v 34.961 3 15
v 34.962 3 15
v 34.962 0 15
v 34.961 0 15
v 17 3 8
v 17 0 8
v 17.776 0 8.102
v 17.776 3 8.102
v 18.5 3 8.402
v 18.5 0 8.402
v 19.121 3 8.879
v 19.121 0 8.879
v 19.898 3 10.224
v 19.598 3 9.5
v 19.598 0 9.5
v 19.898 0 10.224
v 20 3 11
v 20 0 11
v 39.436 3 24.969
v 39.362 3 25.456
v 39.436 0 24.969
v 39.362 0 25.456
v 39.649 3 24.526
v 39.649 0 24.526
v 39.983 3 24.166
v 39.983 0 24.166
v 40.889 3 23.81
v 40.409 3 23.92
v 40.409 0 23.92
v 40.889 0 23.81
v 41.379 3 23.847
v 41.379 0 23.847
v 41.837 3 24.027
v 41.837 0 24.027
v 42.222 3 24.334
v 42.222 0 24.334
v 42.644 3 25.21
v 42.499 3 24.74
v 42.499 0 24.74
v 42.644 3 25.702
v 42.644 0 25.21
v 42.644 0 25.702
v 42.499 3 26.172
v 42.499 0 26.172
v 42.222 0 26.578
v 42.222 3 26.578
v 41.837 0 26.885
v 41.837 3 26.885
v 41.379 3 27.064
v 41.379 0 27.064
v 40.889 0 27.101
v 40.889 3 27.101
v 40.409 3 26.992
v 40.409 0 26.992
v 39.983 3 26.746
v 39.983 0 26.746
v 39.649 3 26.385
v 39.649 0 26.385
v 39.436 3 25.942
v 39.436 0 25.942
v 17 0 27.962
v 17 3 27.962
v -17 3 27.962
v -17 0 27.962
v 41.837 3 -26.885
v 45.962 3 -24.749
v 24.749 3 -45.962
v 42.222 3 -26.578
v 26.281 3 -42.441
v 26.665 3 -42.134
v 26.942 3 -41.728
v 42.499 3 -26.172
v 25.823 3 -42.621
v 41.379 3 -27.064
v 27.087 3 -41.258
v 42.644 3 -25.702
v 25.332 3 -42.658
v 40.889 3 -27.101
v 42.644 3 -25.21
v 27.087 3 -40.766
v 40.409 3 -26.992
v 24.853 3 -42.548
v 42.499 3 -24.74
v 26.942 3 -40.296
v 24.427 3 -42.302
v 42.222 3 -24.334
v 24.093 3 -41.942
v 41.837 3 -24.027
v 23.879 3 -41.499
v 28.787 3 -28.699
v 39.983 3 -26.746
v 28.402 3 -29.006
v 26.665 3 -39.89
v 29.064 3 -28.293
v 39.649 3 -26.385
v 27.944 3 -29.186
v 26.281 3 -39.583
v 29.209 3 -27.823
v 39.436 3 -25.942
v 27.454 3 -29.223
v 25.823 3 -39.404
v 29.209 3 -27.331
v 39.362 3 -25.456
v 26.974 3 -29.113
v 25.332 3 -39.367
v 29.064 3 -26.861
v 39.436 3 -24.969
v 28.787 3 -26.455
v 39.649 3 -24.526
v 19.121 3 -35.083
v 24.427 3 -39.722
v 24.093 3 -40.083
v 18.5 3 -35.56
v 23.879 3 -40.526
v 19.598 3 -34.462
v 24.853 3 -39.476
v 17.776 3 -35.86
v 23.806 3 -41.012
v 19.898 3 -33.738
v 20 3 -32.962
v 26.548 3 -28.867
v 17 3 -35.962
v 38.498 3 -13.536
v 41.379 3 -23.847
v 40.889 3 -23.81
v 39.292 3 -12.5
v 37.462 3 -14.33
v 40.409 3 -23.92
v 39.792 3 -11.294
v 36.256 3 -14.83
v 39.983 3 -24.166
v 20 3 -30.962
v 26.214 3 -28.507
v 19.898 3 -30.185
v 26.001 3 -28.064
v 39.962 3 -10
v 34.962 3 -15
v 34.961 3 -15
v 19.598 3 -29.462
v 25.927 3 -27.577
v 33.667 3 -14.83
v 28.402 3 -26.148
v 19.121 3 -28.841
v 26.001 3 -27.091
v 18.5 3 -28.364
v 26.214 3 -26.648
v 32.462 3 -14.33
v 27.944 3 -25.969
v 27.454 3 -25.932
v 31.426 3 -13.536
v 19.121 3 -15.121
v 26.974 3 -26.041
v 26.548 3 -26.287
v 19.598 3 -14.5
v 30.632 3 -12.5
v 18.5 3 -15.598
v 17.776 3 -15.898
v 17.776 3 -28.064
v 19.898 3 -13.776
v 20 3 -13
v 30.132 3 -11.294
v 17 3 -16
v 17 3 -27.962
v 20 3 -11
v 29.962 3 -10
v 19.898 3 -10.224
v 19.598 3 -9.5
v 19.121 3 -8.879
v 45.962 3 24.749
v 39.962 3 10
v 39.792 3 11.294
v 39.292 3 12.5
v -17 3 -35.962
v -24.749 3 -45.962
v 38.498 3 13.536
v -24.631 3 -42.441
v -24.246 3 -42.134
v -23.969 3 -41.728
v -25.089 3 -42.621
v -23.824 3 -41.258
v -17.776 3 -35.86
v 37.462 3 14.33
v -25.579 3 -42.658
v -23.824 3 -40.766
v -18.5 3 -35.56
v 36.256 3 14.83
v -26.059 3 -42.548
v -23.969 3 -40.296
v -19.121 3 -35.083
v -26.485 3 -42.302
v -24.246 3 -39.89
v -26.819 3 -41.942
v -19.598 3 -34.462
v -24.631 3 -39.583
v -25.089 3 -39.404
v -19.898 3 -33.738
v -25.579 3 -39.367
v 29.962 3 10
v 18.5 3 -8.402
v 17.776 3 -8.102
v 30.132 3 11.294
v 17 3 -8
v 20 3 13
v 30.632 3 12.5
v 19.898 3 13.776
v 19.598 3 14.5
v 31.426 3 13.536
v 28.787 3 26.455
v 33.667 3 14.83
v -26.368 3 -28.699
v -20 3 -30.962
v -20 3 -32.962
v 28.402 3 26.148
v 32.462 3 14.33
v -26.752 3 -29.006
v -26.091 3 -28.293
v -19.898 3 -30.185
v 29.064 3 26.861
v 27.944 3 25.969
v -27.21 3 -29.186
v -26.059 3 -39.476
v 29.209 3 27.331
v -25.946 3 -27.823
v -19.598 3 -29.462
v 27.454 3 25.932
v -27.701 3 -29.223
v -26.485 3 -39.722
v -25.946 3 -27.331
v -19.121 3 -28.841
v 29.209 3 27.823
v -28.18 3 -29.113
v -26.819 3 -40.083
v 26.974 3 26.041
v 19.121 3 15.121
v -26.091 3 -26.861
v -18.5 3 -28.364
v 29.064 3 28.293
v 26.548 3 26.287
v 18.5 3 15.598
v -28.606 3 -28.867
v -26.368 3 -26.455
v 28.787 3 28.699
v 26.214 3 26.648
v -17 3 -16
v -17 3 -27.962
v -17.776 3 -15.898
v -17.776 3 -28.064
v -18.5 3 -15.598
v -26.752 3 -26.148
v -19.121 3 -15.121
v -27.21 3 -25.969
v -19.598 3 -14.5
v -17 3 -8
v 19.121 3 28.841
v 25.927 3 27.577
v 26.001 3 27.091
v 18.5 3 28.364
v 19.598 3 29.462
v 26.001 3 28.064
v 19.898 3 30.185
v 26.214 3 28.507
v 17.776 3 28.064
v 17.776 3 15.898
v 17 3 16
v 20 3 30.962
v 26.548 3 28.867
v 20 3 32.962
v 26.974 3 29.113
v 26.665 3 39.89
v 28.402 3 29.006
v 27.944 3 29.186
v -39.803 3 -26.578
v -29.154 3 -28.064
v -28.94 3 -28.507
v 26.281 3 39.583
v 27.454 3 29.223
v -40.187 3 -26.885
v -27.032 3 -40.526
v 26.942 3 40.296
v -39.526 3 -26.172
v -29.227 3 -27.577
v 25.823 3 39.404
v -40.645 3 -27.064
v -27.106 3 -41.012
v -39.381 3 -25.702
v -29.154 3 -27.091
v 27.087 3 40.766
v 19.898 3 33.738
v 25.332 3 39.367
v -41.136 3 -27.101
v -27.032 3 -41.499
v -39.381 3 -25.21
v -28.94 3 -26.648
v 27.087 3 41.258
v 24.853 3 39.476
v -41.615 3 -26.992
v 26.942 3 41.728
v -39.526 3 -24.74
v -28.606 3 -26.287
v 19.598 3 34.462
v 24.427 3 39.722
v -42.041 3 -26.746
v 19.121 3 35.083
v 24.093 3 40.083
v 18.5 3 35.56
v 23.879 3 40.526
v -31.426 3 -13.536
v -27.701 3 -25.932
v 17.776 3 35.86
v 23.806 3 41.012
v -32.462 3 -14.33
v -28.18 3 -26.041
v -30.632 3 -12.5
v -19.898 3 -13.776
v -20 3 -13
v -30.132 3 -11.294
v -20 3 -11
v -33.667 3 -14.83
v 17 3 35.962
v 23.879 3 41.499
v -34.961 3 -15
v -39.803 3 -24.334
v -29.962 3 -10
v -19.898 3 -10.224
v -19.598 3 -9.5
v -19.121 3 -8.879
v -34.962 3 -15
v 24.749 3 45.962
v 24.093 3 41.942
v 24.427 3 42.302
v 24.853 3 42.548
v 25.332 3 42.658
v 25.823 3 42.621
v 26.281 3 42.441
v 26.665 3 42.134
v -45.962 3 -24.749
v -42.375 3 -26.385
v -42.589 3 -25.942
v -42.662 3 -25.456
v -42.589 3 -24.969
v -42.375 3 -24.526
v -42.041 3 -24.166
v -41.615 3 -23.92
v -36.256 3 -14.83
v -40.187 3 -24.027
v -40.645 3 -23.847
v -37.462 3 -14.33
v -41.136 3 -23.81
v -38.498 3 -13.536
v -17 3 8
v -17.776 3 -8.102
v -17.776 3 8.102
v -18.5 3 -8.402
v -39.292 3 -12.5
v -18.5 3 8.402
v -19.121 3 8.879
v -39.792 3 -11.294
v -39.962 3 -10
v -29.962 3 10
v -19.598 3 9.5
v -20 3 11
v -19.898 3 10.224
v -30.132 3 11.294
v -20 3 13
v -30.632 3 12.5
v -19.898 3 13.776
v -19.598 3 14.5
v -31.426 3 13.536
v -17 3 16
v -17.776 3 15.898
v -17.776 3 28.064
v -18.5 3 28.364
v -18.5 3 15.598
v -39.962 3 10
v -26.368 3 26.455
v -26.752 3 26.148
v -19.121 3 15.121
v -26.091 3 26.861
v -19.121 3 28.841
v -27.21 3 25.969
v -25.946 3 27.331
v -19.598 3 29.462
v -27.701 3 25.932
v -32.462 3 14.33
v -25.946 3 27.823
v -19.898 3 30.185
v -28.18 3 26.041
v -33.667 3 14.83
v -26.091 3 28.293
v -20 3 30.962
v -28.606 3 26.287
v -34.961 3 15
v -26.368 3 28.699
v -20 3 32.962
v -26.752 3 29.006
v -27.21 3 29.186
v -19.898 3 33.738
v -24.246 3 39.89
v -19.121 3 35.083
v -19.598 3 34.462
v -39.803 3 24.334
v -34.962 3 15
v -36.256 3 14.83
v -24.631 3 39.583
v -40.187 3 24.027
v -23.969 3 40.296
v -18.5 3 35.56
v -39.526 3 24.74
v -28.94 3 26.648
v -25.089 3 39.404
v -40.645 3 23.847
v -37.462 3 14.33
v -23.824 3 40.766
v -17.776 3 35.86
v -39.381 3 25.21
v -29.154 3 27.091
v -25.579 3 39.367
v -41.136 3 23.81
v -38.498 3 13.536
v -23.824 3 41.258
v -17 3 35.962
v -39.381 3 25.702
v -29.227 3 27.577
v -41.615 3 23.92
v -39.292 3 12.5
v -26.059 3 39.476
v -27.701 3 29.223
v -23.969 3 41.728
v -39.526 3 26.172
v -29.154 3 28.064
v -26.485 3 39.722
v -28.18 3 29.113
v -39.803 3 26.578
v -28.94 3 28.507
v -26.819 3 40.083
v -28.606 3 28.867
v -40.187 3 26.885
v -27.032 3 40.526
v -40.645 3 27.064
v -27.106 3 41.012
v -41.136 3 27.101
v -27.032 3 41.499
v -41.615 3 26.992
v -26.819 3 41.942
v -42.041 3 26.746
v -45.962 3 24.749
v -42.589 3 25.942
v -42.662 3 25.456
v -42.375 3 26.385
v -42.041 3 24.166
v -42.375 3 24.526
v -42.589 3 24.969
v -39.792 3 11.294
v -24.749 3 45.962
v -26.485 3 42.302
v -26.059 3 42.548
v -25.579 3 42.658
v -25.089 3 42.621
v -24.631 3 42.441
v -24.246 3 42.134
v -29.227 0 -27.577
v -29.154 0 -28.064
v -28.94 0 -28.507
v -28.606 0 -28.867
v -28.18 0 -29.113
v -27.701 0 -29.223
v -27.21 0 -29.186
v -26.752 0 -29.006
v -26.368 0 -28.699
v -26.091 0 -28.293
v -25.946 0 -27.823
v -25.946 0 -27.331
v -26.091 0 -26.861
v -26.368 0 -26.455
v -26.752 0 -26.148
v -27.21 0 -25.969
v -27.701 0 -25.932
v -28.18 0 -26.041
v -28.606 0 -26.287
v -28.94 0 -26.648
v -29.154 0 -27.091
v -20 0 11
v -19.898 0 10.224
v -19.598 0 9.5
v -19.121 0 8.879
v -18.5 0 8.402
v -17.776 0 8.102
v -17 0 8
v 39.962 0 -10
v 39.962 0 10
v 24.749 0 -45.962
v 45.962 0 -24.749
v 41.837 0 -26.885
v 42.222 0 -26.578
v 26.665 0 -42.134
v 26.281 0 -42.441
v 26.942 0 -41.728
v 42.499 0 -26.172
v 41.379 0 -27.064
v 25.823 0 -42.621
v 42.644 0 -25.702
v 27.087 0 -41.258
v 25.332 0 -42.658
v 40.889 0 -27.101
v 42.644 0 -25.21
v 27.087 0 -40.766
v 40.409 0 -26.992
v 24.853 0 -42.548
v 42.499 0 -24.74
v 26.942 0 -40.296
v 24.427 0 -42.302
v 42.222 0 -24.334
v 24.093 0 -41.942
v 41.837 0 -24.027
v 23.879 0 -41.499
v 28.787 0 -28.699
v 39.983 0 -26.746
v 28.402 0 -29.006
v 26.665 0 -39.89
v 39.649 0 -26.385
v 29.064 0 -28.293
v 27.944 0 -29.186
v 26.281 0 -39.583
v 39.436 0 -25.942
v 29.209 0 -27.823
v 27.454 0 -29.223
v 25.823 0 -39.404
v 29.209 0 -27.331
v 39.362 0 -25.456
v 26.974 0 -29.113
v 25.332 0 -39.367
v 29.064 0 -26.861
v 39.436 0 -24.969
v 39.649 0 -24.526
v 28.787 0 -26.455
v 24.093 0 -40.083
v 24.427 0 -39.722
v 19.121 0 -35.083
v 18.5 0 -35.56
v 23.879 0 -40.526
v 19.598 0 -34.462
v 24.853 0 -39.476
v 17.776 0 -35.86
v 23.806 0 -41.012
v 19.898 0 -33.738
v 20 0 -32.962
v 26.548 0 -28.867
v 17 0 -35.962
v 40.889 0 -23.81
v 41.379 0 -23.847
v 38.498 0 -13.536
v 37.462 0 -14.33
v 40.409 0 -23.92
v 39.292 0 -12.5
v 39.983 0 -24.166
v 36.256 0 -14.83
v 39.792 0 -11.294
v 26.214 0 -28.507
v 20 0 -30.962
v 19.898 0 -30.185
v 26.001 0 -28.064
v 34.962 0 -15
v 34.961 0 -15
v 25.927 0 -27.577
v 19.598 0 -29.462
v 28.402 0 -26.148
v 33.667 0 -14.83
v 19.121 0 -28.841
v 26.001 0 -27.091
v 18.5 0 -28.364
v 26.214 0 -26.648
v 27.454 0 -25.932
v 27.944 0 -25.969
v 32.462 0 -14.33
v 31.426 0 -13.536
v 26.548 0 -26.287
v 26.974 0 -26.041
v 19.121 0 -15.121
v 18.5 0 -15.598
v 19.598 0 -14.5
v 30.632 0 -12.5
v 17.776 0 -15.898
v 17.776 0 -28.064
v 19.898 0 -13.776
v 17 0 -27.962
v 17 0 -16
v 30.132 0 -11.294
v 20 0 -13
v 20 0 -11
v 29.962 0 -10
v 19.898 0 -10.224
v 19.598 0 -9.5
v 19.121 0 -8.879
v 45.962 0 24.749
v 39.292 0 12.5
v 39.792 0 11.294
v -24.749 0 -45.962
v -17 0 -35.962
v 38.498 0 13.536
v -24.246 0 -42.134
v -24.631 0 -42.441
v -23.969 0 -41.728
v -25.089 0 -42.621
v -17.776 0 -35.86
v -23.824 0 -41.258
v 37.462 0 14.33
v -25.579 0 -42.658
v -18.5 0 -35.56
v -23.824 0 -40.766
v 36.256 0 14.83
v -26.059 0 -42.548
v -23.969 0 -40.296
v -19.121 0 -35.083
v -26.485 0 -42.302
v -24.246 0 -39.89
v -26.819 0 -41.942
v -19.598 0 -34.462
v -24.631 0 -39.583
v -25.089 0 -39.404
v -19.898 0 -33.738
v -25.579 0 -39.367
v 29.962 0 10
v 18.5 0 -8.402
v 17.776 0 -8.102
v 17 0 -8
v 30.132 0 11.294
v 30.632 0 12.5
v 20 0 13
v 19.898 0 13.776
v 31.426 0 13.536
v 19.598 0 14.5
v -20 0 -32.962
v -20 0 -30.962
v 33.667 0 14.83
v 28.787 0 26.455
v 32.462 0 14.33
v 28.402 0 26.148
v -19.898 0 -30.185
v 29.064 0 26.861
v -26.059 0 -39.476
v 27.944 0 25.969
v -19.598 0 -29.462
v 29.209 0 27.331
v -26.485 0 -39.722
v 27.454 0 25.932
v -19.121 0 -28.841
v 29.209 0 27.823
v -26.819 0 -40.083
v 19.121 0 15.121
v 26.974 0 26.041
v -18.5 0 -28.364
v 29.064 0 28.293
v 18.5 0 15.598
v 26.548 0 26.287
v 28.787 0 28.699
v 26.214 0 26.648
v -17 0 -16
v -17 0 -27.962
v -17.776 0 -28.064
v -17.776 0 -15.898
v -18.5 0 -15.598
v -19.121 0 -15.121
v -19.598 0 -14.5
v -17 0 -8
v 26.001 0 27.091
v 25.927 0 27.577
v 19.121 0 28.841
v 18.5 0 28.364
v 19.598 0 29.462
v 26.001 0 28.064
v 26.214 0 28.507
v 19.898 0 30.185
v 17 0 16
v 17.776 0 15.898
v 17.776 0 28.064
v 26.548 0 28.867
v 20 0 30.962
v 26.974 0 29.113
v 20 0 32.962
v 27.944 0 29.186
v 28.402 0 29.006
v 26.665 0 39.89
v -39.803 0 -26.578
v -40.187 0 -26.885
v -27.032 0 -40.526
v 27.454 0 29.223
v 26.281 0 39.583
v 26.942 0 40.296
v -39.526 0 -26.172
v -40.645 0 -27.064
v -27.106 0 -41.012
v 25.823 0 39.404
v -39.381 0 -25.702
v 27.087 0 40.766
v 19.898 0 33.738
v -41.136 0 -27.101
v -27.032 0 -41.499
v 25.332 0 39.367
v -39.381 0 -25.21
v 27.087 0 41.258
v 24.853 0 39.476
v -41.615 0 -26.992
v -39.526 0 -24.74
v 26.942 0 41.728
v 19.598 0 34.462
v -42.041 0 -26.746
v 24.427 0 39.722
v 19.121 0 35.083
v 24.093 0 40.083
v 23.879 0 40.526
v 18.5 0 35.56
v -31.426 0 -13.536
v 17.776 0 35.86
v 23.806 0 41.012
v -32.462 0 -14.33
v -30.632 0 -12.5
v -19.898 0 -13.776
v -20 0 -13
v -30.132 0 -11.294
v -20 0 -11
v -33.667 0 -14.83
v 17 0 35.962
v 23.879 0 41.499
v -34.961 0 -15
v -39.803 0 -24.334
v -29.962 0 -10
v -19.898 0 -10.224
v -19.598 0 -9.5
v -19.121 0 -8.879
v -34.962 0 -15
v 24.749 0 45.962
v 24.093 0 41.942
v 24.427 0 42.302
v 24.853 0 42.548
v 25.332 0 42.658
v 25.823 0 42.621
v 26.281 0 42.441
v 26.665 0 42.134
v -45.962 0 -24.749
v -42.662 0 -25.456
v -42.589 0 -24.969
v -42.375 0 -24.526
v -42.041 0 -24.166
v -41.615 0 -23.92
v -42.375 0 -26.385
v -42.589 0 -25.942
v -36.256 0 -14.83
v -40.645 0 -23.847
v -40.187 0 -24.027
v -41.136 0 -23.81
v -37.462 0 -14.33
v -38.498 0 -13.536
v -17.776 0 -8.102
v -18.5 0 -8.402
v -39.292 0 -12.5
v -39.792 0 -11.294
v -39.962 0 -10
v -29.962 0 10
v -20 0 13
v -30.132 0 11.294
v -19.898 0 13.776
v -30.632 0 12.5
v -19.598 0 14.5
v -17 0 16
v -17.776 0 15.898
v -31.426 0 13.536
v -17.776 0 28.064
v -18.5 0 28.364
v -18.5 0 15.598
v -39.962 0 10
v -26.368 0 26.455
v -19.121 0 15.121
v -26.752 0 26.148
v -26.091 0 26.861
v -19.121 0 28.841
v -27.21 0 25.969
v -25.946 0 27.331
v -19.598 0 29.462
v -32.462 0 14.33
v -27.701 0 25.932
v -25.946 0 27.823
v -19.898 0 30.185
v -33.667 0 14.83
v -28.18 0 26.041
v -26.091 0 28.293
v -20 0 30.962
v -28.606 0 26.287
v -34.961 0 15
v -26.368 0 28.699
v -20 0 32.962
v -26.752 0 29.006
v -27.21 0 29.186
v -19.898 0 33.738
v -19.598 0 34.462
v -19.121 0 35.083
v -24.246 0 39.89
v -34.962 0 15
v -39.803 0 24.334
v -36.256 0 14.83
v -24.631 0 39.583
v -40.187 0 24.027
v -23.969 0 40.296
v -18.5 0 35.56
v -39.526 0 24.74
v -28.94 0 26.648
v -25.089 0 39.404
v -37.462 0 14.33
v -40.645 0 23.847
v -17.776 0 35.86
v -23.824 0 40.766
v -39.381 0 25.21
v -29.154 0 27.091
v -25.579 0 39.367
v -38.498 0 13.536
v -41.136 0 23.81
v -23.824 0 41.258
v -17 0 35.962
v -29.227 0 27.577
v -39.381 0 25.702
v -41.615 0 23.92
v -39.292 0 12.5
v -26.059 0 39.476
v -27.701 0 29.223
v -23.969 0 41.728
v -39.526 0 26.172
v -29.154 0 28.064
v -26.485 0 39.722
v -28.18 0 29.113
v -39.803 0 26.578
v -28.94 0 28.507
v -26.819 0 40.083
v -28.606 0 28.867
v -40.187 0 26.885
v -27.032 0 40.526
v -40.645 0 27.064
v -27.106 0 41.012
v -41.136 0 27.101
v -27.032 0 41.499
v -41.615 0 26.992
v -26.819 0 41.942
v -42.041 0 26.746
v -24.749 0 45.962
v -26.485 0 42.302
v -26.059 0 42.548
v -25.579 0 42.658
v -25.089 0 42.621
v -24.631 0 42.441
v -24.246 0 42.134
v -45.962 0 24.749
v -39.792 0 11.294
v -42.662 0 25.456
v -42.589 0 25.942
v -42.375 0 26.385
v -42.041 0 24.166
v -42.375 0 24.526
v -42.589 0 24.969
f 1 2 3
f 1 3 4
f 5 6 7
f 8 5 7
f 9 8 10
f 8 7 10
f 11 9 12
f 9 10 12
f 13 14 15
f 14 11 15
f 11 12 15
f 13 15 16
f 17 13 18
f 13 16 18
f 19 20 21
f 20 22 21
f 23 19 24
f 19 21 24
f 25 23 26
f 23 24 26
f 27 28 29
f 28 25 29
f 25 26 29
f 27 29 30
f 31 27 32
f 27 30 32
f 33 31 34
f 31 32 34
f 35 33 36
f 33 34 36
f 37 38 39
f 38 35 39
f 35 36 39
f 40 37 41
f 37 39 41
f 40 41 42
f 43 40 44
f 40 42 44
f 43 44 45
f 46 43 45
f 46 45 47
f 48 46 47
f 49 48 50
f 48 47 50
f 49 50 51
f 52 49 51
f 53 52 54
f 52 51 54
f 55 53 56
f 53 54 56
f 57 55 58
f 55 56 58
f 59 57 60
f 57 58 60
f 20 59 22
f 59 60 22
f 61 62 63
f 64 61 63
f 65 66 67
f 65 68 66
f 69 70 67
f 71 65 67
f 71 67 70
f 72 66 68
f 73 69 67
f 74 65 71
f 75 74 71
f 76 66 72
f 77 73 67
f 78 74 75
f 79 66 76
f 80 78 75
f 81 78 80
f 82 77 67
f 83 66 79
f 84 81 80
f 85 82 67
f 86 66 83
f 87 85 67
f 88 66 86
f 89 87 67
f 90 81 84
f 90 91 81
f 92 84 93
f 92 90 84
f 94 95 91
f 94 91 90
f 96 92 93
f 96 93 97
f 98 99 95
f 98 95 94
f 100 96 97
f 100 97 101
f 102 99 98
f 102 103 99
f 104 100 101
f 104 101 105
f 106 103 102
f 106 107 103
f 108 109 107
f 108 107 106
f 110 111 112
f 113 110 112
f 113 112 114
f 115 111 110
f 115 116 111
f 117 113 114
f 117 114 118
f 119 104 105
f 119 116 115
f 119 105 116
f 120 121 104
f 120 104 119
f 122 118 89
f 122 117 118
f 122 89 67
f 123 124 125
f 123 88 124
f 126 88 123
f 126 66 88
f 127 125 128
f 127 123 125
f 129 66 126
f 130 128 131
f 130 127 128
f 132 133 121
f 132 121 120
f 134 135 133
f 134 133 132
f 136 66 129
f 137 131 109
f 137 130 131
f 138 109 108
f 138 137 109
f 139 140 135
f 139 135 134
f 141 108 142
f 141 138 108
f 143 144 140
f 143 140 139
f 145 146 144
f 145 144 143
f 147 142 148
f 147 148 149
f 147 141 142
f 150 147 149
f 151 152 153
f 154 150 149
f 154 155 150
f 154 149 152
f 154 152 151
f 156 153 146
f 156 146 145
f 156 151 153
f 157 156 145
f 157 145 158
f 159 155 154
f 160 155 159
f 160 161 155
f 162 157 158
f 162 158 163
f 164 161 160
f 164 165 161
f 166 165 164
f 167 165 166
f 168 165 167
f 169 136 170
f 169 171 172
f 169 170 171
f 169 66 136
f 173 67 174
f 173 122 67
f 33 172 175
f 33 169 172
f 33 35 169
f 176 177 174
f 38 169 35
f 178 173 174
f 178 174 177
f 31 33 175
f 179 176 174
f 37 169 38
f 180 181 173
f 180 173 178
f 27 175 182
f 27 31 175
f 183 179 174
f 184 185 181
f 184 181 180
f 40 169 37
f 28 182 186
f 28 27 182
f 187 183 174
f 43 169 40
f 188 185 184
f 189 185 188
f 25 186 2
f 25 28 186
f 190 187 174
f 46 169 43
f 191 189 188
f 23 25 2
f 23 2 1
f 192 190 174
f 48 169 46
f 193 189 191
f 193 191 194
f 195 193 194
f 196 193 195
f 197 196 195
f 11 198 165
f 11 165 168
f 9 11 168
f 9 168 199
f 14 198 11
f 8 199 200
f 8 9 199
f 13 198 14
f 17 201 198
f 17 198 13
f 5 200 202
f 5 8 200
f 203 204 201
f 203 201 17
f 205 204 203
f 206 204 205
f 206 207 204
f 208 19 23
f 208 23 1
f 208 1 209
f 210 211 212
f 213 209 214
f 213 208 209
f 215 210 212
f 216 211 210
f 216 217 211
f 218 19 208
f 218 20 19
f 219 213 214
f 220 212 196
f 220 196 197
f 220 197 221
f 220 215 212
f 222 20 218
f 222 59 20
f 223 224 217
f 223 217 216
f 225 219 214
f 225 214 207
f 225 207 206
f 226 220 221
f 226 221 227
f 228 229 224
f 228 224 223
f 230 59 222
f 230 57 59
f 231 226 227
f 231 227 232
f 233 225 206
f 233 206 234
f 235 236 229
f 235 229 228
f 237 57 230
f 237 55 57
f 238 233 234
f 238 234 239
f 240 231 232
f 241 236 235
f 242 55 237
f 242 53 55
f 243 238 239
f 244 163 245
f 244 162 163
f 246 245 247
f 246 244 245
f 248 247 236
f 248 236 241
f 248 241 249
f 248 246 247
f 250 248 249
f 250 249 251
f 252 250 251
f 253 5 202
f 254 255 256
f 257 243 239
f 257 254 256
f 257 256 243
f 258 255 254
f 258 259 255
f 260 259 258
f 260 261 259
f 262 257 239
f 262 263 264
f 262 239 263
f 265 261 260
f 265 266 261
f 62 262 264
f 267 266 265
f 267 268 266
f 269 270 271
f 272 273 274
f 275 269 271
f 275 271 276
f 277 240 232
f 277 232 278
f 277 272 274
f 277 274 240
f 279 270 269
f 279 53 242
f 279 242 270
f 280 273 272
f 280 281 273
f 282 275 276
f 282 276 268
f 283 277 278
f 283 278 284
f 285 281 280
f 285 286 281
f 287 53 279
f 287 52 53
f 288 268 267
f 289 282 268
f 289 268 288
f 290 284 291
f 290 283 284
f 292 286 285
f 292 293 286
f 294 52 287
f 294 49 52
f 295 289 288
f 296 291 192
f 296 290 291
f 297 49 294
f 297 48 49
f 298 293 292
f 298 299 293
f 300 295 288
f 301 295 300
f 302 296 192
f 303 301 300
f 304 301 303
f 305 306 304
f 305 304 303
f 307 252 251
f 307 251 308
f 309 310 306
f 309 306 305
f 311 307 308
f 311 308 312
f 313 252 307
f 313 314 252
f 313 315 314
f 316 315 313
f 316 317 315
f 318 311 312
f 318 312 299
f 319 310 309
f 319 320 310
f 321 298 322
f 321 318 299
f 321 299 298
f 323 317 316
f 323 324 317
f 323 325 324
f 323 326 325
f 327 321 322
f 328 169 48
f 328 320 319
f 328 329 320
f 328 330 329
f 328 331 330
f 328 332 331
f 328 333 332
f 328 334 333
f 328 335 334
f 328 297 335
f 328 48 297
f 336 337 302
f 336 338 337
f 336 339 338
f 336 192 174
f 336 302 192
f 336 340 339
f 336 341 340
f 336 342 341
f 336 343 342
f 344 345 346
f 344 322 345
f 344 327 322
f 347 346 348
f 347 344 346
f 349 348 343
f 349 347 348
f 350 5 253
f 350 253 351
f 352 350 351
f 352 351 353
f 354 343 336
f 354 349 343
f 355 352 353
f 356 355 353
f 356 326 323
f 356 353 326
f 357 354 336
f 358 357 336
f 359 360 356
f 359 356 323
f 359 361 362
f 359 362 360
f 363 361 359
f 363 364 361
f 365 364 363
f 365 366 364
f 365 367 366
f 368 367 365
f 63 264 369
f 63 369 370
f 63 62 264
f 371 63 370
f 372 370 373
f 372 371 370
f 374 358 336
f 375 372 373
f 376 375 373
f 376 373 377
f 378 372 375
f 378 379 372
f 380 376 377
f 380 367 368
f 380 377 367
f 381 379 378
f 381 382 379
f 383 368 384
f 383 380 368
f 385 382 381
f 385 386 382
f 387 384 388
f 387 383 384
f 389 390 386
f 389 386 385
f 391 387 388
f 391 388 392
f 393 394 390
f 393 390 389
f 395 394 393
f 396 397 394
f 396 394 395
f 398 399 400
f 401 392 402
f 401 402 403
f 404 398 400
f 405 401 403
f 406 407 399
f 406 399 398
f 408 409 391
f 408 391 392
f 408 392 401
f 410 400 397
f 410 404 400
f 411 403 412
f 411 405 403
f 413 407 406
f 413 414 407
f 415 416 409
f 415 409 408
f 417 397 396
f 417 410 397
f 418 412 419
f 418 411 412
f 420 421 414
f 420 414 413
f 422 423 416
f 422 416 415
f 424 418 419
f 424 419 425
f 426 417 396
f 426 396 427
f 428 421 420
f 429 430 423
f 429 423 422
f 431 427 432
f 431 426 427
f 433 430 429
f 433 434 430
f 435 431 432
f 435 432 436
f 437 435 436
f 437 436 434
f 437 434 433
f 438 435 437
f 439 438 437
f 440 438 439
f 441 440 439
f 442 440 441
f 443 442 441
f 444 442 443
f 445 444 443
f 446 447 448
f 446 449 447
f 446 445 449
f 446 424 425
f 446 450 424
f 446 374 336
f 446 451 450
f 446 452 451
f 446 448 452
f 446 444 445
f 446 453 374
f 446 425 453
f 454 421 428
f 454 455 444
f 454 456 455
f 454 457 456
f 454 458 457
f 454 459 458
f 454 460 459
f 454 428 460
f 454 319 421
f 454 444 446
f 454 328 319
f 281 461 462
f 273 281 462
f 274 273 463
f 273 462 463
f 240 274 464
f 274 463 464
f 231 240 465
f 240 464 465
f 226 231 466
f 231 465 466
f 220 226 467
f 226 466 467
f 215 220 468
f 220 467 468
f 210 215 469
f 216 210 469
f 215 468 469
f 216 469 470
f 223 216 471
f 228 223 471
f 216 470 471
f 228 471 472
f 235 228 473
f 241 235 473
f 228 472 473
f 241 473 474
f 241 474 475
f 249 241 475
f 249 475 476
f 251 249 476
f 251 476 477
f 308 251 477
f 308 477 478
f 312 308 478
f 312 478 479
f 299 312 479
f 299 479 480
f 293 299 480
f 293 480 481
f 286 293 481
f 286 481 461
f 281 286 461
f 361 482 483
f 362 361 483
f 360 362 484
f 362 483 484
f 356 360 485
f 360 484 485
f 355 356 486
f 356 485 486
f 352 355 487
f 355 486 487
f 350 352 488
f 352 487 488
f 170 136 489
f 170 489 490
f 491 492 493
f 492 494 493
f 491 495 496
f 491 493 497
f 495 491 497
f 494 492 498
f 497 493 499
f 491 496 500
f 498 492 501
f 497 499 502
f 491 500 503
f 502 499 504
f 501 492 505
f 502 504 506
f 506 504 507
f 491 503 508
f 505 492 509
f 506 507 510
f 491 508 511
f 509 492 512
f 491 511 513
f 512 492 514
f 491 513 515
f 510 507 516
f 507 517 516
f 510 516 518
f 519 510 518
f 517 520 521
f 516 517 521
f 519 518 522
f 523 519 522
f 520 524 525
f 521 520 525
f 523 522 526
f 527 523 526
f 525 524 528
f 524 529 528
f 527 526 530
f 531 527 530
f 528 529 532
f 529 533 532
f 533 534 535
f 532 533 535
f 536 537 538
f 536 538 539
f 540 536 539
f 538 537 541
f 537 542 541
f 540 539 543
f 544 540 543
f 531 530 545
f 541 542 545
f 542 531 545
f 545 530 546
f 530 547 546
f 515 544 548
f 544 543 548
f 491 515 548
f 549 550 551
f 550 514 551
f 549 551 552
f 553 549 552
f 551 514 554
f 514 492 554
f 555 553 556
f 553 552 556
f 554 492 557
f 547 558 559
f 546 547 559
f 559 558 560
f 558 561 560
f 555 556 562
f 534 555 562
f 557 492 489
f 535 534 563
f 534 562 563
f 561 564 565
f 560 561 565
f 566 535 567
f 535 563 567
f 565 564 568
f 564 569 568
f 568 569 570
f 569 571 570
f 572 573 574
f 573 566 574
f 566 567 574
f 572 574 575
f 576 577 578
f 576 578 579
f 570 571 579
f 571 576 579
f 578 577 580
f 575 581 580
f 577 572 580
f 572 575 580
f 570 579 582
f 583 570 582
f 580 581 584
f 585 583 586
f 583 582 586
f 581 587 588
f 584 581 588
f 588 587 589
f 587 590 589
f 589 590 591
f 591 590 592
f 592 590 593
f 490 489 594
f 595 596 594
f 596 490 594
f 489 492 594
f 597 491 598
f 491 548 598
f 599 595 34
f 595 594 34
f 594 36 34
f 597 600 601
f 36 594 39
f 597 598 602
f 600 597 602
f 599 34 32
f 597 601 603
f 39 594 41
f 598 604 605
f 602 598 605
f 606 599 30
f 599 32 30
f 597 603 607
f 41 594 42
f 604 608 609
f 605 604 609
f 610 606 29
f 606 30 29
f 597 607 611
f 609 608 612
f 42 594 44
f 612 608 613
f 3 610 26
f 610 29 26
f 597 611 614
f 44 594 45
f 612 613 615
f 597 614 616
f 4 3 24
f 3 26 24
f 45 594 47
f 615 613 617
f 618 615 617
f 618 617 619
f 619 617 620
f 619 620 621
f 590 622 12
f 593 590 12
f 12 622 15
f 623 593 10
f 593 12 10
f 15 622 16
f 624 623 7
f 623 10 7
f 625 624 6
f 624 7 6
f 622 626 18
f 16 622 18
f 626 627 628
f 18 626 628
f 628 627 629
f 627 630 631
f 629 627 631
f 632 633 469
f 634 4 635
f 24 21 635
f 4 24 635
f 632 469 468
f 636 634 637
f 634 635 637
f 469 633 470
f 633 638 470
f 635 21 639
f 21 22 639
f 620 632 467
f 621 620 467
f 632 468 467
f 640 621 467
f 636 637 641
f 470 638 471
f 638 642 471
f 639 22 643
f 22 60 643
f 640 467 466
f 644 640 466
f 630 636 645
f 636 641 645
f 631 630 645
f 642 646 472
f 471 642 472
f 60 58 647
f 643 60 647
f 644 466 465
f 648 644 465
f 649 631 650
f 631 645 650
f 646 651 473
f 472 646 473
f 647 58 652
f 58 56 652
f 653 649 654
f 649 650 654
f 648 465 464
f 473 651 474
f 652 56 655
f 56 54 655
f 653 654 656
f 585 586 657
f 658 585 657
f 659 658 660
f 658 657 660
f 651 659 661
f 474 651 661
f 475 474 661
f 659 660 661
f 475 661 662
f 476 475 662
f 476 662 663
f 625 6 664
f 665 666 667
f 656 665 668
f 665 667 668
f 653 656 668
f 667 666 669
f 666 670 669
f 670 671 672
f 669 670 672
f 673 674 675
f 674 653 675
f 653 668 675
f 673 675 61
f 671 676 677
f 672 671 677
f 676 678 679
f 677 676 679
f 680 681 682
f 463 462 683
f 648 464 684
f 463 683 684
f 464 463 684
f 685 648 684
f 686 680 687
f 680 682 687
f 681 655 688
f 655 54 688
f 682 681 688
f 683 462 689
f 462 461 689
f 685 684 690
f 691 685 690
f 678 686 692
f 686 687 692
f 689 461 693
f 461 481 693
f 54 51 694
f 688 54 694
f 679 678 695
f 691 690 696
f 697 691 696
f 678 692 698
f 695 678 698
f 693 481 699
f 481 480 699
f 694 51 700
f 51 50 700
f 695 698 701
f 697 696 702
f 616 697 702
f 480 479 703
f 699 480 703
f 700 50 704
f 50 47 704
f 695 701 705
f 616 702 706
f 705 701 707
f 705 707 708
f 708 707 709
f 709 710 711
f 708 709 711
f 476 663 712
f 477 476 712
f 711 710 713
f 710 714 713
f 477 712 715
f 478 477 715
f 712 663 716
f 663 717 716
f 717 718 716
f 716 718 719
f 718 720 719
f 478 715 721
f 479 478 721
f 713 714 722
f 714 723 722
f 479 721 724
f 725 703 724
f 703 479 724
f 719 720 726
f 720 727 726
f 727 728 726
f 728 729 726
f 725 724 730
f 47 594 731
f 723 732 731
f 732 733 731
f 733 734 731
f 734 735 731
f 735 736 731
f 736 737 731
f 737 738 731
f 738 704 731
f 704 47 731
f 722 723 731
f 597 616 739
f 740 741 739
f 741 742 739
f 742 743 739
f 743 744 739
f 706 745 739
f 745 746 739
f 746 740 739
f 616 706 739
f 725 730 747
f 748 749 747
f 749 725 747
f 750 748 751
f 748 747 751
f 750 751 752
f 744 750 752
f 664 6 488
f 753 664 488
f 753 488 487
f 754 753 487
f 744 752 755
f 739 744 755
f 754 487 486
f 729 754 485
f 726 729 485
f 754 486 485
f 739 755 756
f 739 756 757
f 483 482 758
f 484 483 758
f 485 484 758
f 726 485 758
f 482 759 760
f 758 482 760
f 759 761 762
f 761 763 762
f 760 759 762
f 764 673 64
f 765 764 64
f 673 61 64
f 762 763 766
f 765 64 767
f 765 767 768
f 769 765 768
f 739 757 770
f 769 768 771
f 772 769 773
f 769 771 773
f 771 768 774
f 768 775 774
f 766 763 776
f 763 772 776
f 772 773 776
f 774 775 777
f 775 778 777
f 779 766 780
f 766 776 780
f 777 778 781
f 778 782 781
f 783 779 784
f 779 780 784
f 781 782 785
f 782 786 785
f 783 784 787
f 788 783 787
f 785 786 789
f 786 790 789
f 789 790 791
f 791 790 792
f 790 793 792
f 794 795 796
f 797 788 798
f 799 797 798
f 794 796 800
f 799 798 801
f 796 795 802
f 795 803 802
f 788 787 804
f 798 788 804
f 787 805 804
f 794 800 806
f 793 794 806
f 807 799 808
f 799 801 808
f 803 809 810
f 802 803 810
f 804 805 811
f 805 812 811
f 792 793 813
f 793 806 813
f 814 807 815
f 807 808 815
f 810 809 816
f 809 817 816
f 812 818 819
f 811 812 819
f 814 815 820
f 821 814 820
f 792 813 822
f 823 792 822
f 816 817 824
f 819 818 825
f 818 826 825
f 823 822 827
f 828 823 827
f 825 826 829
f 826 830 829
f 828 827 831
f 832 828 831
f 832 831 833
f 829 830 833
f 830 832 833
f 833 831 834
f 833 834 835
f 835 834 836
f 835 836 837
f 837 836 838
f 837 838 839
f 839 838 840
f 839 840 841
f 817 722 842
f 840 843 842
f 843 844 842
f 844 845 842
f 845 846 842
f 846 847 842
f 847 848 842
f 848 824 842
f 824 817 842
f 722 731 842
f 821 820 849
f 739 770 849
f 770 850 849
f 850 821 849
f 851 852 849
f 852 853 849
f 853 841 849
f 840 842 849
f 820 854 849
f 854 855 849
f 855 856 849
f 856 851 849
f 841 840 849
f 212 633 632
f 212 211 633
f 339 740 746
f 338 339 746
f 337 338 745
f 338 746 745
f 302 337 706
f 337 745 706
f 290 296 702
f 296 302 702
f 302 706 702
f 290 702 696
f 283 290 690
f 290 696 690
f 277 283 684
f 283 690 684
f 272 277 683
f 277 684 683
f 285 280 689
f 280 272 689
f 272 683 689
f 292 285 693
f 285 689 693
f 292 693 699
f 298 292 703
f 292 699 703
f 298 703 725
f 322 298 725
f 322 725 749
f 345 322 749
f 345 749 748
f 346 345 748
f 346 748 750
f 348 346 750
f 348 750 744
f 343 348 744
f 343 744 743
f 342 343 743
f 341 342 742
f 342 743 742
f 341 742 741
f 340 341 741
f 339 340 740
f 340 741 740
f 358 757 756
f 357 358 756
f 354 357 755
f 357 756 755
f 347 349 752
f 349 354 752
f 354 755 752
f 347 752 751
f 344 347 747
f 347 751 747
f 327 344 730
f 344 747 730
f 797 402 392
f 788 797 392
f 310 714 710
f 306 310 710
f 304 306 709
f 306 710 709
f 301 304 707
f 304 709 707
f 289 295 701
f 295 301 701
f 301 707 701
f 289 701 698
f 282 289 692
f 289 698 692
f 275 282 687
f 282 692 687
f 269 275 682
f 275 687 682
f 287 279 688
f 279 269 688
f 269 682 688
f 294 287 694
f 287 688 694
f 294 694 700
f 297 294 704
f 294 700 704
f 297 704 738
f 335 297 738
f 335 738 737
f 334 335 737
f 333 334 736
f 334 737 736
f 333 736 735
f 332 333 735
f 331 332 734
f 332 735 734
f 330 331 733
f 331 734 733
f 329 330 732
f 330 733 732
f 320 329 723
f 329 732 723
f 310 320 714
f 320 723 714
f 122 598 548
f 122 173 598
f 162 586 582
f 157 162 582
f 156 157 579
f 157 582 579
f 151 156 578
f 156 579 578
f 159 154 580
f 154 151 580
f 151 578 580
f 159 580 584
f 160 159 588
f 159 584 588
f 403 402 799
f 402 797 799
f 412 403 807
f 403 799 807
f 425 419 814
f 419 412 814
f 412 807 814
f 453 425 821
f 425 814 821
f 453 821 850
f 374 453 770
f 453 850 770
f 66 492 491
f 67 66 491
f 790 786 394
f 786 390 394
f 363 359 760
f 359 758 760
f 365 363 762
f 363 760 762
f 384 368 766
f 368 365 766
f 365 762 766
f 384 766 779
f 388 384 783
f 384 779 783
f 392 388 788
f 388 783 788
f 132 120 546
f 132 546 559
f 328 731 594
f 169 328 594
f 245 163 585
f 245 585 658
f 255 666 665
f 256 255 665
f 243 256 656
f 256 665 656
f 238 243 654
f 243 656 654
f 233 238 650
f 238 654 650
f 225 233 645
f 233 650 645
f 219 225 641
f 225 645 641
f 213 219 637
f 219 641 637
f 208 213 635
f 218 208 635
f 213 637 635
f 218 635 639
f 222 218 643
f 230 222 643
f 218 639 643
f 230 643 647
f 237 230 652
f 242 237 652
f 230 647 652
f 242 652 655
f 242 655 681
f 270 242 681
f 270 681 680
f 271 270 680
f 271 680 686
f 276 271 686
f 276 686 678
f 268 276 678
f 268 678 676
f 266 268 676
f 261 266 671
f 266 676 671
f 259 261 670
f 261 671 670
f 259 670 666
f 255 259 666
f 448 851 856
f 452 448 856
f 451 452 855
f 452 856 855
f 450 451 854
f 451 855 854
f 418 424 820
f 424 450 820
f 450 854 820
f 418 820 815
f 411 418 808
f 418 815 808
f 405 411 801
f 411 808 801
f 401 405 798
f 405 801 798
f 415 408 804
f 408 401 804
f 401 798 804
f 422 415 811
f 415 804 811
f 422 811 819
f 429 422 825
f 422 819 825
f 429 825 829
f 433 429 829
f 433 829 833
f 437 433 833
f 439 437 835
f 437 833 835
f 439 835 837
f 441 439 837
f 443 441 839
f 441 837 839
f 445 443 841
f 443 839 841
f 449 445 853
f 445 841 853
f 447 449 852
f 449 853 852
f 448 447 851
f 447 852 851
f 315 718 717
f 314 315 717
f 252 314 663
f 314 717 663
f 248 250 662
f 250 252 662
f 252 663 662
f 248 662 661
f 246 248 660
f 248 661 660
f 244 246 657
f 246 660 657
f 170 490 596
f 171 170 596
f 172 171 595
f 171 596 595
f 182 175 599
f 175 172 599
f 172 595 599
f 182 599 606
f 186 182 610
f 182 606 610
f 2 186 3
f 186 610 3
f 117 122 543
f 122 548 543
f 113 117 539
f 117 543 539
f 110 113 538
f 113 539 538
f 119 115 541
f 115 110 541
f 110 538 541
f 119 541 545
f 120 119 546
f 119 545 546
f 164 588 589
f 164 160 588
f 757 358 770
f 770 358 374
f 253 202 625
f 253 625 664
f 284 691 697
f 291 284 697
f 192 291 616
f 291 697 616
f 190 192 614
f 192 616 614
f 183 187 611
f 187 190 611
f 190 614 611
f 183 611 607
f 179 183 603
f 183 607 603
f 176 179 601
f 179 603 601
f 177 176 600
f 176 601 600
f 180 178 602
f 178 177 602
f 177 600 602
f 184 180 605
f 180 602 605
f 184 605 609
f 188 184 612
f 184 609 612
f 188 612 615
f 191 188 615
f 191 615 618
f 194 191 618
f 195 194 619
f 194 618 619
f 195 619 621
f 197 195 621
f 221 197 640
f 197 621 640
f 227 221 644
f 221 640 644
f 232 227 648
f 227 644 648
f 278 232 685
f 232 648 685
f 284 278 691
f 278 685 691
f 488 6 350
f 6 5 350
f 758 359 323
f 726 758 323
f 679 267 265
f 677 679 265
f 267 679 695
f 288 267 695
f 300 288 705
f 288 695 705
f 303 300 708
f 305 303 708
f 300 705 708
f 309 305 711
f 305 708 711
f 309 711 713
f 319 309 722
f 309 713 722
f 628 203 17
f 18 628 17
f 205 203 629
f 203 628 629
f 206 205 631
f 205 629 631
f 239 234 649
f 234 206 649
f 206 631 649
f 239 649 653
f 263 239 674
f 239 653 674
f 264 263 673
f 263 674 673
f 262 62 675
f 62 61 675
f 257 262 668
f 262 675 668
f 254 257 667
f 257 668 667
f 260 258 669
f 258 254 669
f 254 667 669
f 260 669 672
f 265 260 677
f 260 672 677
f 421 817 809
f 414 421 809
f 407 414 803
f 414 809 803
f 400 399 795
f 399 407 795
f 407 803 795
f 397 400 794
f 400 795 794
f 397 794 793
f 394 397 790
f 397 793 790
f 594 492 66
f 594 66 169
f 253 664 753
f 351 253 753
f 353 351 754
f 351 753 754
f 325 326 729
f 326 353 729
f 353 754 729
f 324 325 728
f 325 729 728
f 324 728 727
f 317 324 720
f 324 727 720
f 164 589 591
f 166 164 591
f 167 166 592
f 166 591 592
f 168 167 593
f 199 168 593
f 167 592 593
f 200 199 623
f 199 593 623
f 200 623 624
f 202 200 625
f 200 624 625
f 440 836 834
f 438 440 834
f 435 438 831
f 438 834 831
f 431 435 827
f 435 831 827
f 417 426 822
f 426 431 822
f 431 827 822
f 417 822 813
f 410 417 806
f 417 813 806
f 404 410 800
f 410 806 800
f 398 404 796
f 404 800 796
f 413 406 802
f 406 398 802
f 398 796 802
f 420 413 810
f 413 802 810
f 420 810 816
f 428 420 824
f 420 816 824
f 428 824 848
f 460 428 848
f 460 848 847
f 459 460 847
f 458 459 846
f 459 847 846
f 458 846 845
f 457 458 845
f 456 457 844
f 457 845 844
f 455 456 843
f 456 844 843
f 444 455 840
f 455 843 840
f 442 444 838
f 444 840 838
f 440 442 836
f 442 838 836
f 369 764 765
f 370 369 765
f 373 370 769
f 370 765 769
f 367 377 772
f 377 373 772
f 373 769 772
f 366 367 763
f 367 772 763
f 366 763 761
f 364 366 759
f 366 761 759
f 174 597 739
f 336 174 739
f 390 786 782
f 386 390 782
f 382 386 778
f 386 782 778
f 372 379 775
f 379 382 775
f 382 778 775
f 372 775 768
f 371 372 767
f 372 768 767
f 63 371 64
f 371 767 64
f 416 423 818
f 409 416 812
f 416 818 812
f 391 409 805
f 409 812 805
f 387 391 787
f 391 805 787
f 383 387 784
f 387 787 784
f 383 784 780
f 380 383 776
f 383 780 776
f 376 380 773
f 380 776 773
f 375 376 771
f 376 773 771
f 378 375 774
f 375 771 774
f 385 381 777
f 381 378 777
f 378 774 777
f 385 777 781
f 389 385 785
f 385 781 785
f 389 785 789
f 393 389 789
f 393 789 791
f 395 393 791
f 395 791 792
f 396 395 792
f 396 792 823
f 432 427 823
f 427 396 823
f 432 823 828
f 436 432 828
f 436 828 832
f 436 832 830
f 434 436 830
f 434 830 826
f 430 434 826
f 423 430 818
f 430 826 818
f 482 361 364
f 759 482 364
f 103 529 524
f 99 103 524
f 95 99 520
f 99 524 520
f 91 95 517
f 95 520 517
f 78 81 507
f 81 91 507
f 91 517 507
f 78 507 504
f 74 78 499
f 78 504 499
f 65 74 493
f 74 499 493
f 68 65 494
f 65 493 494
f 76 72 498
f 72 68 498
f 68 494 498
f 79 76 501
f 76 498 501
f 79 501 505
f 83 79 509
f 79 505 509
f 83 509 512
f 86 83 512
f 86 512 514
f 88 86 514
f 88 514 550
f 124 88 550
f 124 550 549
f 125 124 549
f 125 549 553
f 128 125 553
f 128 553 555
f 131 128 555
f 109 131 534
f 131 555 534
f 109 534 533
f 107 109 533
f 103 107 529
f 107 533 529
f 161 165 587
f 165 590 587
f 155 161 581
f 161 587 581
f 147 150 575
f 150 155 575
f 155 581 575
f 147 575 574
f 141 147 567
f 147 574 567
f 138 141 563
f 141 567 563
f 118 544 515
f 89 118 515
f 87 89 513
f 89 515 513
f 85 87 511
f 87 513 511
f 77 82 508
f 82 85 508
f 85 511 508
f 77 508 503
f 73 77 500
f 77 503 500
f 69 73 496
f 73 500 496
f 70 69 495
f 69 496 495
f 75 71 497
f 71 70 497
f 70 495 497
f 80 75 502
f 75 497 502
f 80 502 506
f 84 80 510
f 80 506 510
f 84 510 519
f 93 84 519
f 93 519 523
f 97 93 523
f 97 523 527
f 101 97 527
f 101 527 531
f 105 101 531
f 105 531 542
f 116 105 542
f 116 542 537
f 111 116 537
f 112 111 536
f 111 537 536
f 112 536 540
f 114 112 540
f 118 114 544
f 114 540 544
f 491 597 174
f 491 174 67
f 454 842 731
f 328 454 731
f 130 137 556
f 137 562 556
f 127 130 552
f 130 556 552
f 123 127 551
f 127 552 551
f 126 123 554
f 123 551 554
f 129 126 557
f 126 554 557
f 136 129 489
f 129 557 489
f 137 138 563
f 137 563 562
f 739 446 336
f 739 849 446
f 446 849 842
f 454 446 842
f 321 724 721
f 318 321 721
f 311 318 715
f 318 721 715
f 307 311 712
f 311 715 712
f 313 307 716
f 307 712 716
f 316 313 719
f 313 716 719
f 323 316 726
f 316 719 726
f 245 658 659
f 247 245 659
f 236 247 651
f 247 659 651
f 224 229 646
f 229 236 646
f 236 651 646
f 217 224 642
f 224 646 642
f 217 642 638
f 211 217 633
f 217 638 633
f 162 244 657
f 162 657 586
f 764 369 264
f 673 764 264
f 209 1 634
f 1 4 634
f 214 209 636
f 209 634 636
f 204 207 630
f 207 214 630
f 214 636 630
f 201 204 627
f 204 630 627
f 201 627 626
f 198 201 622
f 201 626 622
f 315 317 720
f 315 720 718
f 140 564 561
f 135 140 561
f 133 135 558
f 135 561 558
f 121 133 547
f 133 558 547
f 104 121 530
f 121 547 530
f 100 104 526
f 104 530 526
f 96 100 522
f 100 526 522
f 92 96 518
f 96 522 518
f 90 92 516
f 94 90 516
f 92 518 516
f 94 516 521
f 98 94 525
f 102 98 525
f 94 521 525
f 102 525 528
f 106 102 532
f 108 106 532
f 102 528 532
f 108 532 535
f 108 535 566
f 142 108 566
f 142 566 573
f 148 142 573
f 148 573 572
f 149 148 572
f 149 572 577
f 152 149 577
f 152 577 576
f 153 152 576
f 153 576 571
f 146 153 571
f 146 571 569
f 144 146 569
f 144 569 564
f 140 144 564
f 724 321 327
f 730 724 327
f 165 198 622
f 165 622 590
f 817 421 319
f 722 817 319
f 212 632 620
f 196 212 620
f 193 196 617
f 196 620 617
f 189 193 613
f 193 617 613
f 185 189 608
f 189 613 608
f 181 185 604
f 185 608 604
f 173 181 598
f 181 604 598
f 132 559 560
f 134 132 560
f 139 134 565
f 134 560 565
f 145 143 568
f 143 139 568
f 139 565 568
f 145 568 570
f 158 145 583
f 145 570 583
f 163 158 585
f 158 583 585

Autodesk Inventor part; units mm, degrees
ref_plane "YZ Plane" through (0, 0, 0) normal (1, 0, 0) x (0, 1, 0)
ref_plane "XZ Plane" through (0, 0, 0) normal (0, 1, 0) x (-1, 0, 0)
ref_plane "XY Plane" through (0, 0, 0) normal (0, 0, 1) x (1, 0, 0)
sketch "草图1" plane through (0, 0, 0) normal (0, 1, 0) x (-1, 0, 0)
  line L0 (35.3553, 35.3553) -> (-35.3553, 35.3553)
  line L1 (-35.3553, 35.3553) -> (-35.3553, -35.3553)
  line L2 (-35.3553, -35.3553) -> (35.3553, -35.3553)
  line L3 (35.3553, -35.3553) -> (35.3553, 35.3553)
  line L4 (35.3553, 35.3553) -> (-35.3553, -35.3553)
  line L5 (35.3553, -35.3553) -> (-35.3553, 35.3553)
  line L6 (-24.7487, 45.9619) -> (-45.9619, 24.7487)
  line L7 (-45.9619, -24.7487) -> (-24.7487, -45.9619)
  line L8 (24.7487, -45.9619) -> (45.9619, -24.7487)
  line L9 (45.9619, 24.7487) -> (24.7487, 45.9619)
  line L10 (24.7487, 45.9619) -> (-24.7487, 45.9619)
  line L11 (45.9619, 24.7487) -> (45.9619, -24.7487)
  line L12 (24.7487, -45.9619) -> (-24.7487, -45.9619)
  line L13 (-45.9619, -24.7487) -> (-45.9619, 24.7487)
  circle A0 centre (41.0122, 25.4558) radius 1.65
  circle A1 centre (27.5772, 27.5772) radius 1.65
  circle A2 centre (25.4558, 41.0122) radius 1.65
  circle A3 centre (-25.4558, 41.0122) radius 1.65
  circle A4 centre (-27.5772, 27.5772) radius 1.65
  circle A5 centre (-41.0122, 25.4558) radius 1.65
  circle A6 centre (-41.0122, -25.4558) radius 1.65
  circle A7 centre (-27.5772, -27.5772) radius 1.65
  circle A8 centre (-25.4558, -41.0122) radius 1.65
  circle A9 centre (25.4558, -41.0122) radius 1.65
  circle A10 centre (27.5772, -27.5772) radius 1.65
  circle A11 centre (41.0122, -25.4558) radius 1.65
  point P0 (0, 0)
  point P1 (0, 0)
  point P2 (-35.3553, -35.3553)
  point P3 (35.3553, -35.3553)
  dimension "d0" = 100
  dimension "d1" = 30
  dimension "d2" = 45
  dimension "d5" = 360
  dimension "d12" = 3.3
  dimension "d13" = 3
  dimension "d14" = 11
  dimension "d15" = 3.3
  dimension "d16" = 11
  dimension "d19" = 360
extrude "拉伸1" add sketch "草图1" along normal blind 3 contours L4 A1 L5 A4 L0 | L9 L11 L8 L3 | L3 L5 A10 L4 A1 | L0 L6 L10 L9 | L5 A4 L4 A7 L1 | L1 L7 L13 L6 | L8 L12 L7 L2 | L2 L4 A7 L5 A10
sketch "草图2" plane through (0, 3, 0) normal (0, 1, 0) x (1, 0, 0)
  line L0 (45.9619, -24.7487) -> (45.9619, 24.7487) projected
  line L1 (45.9619, 24.7487) -> (24.7487, 45.9619) projected
  line L2 (24.7487, 45.9619) -> (-24.7487, 45.9619) projected
  line L3 (-24.7487, 45.9619) -> (-45.9619, 24.7487) projected
  line L4 (-45.9619, 24.7487) -> (-45.9619, -24.7487) projected
  line L5 (-45.9619, -24.7487) -> (-24.7487, -45.9619) projected
  line L6 (-24.7487, -45.9619) -> (24.7487, -45.9619) projected
  line L7 (24.7487, -45.9619) -> (45.9619, -24.7487) projected
  circle A0 centre (27.5772, 27.5772) radius 1.65 projected
  circle A1 centre (-27.5772, 27.5772) radius 1.65 projected
  circle A2 centre (25.4558, -41.0122) radius 1.65 projected
  circle A3 centre (-25.4558, -41.0122) radius 1.65 projected
  circle A4 centre (-41.0122, 25.4558) radius 1.65 projected
  circle A5 centre (-41.0122, -25.4558) radius 1.65 projected
  circle A6 centre (25.4558, 41.0122) radius 1.65 projected
  circle A7 centre (-25.4558, 41.0122) radius 1.65 projected
  circle A8 centre (-27.5772, -27.5772) radius 1.65 projected
  circle A9 centre (41.0122, -25.4558) radius 1.65 projected
  circle A10 centre (41.0122, 25.4558) radius 1.65 projected
  circle A11 centre (27.5772, -27.5772) radius 1.65 projected
  line L8 (-45.9619, 0) -> (0, 0)
  line L9 (0, 0) -> (45.9619, 0)
  line L10 (0, 0) -> (0, 45.9619)
  line L11 (0, 0) -> (0, -45.9619)
  line L12 (-39.9619, -15) -> (-29.9619, -15)
  line L13 (-29.9619, -15) -> (-29.9619, 15)
  line L14 (-29.9619, 15) -> (-39.9619, 15)
  line L15 (-39.9619, 15) -> (-39.9619, -15)
  line L16 (-20, -16) -> (20, -16)
  line L17 (20, -16) -> (20, -8)
  line L18 (20, -8) -> (-20, -8)
  line L19 (-20, -8) -> (-20, -16)
  line L20 (39.9619, -15) -> (29.9619, -15)
  line L21 (29.9619, -15) -> (29.9619, 15)
  line L22 (29.9619, 15) -> (39.9619, 15)
  line L23 (39.9619, 15) -> (39.9619, -15)
  line L24 (-20, -35.9619) -> (20, -35.9619)
  line L25 (20, -35.9619) -> (20, -27.9619)
  line L26 (20, -27.9619) -> (-20, -27.9619)
  line L27 (-20, -27.9619) -> (-20, -35.9619)
  line L28 (-20, 16) -> (20, 16)
  line L29 (20, 16) -> (20, 8)
  line L30 (20, 8) -> (-20, 8)
  line L31 (-20, 8) -> (-20, 16)
  line L32 (-20, 35.9619) -> (20, 35.9619)
  line L33 (20, 35.9619) -> (20, 27.9619)
  line L34 (20, 27.9619) -> (-20, 27.9619)
  line L35 (-20, 27.9619) -> (-20, 35.9619)
  dimension "d21" = 30
  dimension "d22" = 10
  dimension "d23" = 6
  dimension "d24" = 15
  dimension "d25" = 8
  dimension "d27" = 8
  dimension "d29" = 40
  dimension "d30" = 20
  dimension "d31" = 8
  dimension "d32" = 40
  dimension "d33" = 20
  dimension "d34" = 10
extrude "拉伸2" cut sketch "草图2" against normal through all contours L23 L20 L21 L9 | L9 L21 L22 L23 | L24 L27 L26 L11 | L11 L26 L25 L24 | L32 L33 L34 L10 | L10 L34 L35 L32 | L13 L12 L15 L8 | L8 L15 L14 L13 | L30 L31 L28 L10 | L10 L28 L29 L30 | L18 L17 L16 L11 | L11 L16 L19 L18
fillet "圆角1" radius 5 8 edges at (-39.9619, 1.5, 15) (-29.9619, 1.5, 15) (-39.9619, 1.5, -15) (-29.9619, 1.5, -15) (29.9619, 1.5, -15) (39.9619, 1.5, -15) (39.9619, 1.5, 15) (29.9619, 1.5, 15)
fillet "圆角2" radius 3 16 edges at (-20, 1.5, 35.9619) (-20, 1.5, 27.9619) (20, 1.5, 35.9619) (20, 1.5, 27.9619) (-20, 1.5, 16) (-20, 1.5, 8) (20, 1.5, 16) (20, 1.5, 8) (-20, 1.5, -8) (20, 1.5, -8) (-20, 1.5, -16) (20, 1.5, -16) (-20, 1.5, -27.9619) (-20, 1.5, -35.9619) (20, 1.5, -27.9619) (20, 1.5, -35.9619)
properties part number "上板"
